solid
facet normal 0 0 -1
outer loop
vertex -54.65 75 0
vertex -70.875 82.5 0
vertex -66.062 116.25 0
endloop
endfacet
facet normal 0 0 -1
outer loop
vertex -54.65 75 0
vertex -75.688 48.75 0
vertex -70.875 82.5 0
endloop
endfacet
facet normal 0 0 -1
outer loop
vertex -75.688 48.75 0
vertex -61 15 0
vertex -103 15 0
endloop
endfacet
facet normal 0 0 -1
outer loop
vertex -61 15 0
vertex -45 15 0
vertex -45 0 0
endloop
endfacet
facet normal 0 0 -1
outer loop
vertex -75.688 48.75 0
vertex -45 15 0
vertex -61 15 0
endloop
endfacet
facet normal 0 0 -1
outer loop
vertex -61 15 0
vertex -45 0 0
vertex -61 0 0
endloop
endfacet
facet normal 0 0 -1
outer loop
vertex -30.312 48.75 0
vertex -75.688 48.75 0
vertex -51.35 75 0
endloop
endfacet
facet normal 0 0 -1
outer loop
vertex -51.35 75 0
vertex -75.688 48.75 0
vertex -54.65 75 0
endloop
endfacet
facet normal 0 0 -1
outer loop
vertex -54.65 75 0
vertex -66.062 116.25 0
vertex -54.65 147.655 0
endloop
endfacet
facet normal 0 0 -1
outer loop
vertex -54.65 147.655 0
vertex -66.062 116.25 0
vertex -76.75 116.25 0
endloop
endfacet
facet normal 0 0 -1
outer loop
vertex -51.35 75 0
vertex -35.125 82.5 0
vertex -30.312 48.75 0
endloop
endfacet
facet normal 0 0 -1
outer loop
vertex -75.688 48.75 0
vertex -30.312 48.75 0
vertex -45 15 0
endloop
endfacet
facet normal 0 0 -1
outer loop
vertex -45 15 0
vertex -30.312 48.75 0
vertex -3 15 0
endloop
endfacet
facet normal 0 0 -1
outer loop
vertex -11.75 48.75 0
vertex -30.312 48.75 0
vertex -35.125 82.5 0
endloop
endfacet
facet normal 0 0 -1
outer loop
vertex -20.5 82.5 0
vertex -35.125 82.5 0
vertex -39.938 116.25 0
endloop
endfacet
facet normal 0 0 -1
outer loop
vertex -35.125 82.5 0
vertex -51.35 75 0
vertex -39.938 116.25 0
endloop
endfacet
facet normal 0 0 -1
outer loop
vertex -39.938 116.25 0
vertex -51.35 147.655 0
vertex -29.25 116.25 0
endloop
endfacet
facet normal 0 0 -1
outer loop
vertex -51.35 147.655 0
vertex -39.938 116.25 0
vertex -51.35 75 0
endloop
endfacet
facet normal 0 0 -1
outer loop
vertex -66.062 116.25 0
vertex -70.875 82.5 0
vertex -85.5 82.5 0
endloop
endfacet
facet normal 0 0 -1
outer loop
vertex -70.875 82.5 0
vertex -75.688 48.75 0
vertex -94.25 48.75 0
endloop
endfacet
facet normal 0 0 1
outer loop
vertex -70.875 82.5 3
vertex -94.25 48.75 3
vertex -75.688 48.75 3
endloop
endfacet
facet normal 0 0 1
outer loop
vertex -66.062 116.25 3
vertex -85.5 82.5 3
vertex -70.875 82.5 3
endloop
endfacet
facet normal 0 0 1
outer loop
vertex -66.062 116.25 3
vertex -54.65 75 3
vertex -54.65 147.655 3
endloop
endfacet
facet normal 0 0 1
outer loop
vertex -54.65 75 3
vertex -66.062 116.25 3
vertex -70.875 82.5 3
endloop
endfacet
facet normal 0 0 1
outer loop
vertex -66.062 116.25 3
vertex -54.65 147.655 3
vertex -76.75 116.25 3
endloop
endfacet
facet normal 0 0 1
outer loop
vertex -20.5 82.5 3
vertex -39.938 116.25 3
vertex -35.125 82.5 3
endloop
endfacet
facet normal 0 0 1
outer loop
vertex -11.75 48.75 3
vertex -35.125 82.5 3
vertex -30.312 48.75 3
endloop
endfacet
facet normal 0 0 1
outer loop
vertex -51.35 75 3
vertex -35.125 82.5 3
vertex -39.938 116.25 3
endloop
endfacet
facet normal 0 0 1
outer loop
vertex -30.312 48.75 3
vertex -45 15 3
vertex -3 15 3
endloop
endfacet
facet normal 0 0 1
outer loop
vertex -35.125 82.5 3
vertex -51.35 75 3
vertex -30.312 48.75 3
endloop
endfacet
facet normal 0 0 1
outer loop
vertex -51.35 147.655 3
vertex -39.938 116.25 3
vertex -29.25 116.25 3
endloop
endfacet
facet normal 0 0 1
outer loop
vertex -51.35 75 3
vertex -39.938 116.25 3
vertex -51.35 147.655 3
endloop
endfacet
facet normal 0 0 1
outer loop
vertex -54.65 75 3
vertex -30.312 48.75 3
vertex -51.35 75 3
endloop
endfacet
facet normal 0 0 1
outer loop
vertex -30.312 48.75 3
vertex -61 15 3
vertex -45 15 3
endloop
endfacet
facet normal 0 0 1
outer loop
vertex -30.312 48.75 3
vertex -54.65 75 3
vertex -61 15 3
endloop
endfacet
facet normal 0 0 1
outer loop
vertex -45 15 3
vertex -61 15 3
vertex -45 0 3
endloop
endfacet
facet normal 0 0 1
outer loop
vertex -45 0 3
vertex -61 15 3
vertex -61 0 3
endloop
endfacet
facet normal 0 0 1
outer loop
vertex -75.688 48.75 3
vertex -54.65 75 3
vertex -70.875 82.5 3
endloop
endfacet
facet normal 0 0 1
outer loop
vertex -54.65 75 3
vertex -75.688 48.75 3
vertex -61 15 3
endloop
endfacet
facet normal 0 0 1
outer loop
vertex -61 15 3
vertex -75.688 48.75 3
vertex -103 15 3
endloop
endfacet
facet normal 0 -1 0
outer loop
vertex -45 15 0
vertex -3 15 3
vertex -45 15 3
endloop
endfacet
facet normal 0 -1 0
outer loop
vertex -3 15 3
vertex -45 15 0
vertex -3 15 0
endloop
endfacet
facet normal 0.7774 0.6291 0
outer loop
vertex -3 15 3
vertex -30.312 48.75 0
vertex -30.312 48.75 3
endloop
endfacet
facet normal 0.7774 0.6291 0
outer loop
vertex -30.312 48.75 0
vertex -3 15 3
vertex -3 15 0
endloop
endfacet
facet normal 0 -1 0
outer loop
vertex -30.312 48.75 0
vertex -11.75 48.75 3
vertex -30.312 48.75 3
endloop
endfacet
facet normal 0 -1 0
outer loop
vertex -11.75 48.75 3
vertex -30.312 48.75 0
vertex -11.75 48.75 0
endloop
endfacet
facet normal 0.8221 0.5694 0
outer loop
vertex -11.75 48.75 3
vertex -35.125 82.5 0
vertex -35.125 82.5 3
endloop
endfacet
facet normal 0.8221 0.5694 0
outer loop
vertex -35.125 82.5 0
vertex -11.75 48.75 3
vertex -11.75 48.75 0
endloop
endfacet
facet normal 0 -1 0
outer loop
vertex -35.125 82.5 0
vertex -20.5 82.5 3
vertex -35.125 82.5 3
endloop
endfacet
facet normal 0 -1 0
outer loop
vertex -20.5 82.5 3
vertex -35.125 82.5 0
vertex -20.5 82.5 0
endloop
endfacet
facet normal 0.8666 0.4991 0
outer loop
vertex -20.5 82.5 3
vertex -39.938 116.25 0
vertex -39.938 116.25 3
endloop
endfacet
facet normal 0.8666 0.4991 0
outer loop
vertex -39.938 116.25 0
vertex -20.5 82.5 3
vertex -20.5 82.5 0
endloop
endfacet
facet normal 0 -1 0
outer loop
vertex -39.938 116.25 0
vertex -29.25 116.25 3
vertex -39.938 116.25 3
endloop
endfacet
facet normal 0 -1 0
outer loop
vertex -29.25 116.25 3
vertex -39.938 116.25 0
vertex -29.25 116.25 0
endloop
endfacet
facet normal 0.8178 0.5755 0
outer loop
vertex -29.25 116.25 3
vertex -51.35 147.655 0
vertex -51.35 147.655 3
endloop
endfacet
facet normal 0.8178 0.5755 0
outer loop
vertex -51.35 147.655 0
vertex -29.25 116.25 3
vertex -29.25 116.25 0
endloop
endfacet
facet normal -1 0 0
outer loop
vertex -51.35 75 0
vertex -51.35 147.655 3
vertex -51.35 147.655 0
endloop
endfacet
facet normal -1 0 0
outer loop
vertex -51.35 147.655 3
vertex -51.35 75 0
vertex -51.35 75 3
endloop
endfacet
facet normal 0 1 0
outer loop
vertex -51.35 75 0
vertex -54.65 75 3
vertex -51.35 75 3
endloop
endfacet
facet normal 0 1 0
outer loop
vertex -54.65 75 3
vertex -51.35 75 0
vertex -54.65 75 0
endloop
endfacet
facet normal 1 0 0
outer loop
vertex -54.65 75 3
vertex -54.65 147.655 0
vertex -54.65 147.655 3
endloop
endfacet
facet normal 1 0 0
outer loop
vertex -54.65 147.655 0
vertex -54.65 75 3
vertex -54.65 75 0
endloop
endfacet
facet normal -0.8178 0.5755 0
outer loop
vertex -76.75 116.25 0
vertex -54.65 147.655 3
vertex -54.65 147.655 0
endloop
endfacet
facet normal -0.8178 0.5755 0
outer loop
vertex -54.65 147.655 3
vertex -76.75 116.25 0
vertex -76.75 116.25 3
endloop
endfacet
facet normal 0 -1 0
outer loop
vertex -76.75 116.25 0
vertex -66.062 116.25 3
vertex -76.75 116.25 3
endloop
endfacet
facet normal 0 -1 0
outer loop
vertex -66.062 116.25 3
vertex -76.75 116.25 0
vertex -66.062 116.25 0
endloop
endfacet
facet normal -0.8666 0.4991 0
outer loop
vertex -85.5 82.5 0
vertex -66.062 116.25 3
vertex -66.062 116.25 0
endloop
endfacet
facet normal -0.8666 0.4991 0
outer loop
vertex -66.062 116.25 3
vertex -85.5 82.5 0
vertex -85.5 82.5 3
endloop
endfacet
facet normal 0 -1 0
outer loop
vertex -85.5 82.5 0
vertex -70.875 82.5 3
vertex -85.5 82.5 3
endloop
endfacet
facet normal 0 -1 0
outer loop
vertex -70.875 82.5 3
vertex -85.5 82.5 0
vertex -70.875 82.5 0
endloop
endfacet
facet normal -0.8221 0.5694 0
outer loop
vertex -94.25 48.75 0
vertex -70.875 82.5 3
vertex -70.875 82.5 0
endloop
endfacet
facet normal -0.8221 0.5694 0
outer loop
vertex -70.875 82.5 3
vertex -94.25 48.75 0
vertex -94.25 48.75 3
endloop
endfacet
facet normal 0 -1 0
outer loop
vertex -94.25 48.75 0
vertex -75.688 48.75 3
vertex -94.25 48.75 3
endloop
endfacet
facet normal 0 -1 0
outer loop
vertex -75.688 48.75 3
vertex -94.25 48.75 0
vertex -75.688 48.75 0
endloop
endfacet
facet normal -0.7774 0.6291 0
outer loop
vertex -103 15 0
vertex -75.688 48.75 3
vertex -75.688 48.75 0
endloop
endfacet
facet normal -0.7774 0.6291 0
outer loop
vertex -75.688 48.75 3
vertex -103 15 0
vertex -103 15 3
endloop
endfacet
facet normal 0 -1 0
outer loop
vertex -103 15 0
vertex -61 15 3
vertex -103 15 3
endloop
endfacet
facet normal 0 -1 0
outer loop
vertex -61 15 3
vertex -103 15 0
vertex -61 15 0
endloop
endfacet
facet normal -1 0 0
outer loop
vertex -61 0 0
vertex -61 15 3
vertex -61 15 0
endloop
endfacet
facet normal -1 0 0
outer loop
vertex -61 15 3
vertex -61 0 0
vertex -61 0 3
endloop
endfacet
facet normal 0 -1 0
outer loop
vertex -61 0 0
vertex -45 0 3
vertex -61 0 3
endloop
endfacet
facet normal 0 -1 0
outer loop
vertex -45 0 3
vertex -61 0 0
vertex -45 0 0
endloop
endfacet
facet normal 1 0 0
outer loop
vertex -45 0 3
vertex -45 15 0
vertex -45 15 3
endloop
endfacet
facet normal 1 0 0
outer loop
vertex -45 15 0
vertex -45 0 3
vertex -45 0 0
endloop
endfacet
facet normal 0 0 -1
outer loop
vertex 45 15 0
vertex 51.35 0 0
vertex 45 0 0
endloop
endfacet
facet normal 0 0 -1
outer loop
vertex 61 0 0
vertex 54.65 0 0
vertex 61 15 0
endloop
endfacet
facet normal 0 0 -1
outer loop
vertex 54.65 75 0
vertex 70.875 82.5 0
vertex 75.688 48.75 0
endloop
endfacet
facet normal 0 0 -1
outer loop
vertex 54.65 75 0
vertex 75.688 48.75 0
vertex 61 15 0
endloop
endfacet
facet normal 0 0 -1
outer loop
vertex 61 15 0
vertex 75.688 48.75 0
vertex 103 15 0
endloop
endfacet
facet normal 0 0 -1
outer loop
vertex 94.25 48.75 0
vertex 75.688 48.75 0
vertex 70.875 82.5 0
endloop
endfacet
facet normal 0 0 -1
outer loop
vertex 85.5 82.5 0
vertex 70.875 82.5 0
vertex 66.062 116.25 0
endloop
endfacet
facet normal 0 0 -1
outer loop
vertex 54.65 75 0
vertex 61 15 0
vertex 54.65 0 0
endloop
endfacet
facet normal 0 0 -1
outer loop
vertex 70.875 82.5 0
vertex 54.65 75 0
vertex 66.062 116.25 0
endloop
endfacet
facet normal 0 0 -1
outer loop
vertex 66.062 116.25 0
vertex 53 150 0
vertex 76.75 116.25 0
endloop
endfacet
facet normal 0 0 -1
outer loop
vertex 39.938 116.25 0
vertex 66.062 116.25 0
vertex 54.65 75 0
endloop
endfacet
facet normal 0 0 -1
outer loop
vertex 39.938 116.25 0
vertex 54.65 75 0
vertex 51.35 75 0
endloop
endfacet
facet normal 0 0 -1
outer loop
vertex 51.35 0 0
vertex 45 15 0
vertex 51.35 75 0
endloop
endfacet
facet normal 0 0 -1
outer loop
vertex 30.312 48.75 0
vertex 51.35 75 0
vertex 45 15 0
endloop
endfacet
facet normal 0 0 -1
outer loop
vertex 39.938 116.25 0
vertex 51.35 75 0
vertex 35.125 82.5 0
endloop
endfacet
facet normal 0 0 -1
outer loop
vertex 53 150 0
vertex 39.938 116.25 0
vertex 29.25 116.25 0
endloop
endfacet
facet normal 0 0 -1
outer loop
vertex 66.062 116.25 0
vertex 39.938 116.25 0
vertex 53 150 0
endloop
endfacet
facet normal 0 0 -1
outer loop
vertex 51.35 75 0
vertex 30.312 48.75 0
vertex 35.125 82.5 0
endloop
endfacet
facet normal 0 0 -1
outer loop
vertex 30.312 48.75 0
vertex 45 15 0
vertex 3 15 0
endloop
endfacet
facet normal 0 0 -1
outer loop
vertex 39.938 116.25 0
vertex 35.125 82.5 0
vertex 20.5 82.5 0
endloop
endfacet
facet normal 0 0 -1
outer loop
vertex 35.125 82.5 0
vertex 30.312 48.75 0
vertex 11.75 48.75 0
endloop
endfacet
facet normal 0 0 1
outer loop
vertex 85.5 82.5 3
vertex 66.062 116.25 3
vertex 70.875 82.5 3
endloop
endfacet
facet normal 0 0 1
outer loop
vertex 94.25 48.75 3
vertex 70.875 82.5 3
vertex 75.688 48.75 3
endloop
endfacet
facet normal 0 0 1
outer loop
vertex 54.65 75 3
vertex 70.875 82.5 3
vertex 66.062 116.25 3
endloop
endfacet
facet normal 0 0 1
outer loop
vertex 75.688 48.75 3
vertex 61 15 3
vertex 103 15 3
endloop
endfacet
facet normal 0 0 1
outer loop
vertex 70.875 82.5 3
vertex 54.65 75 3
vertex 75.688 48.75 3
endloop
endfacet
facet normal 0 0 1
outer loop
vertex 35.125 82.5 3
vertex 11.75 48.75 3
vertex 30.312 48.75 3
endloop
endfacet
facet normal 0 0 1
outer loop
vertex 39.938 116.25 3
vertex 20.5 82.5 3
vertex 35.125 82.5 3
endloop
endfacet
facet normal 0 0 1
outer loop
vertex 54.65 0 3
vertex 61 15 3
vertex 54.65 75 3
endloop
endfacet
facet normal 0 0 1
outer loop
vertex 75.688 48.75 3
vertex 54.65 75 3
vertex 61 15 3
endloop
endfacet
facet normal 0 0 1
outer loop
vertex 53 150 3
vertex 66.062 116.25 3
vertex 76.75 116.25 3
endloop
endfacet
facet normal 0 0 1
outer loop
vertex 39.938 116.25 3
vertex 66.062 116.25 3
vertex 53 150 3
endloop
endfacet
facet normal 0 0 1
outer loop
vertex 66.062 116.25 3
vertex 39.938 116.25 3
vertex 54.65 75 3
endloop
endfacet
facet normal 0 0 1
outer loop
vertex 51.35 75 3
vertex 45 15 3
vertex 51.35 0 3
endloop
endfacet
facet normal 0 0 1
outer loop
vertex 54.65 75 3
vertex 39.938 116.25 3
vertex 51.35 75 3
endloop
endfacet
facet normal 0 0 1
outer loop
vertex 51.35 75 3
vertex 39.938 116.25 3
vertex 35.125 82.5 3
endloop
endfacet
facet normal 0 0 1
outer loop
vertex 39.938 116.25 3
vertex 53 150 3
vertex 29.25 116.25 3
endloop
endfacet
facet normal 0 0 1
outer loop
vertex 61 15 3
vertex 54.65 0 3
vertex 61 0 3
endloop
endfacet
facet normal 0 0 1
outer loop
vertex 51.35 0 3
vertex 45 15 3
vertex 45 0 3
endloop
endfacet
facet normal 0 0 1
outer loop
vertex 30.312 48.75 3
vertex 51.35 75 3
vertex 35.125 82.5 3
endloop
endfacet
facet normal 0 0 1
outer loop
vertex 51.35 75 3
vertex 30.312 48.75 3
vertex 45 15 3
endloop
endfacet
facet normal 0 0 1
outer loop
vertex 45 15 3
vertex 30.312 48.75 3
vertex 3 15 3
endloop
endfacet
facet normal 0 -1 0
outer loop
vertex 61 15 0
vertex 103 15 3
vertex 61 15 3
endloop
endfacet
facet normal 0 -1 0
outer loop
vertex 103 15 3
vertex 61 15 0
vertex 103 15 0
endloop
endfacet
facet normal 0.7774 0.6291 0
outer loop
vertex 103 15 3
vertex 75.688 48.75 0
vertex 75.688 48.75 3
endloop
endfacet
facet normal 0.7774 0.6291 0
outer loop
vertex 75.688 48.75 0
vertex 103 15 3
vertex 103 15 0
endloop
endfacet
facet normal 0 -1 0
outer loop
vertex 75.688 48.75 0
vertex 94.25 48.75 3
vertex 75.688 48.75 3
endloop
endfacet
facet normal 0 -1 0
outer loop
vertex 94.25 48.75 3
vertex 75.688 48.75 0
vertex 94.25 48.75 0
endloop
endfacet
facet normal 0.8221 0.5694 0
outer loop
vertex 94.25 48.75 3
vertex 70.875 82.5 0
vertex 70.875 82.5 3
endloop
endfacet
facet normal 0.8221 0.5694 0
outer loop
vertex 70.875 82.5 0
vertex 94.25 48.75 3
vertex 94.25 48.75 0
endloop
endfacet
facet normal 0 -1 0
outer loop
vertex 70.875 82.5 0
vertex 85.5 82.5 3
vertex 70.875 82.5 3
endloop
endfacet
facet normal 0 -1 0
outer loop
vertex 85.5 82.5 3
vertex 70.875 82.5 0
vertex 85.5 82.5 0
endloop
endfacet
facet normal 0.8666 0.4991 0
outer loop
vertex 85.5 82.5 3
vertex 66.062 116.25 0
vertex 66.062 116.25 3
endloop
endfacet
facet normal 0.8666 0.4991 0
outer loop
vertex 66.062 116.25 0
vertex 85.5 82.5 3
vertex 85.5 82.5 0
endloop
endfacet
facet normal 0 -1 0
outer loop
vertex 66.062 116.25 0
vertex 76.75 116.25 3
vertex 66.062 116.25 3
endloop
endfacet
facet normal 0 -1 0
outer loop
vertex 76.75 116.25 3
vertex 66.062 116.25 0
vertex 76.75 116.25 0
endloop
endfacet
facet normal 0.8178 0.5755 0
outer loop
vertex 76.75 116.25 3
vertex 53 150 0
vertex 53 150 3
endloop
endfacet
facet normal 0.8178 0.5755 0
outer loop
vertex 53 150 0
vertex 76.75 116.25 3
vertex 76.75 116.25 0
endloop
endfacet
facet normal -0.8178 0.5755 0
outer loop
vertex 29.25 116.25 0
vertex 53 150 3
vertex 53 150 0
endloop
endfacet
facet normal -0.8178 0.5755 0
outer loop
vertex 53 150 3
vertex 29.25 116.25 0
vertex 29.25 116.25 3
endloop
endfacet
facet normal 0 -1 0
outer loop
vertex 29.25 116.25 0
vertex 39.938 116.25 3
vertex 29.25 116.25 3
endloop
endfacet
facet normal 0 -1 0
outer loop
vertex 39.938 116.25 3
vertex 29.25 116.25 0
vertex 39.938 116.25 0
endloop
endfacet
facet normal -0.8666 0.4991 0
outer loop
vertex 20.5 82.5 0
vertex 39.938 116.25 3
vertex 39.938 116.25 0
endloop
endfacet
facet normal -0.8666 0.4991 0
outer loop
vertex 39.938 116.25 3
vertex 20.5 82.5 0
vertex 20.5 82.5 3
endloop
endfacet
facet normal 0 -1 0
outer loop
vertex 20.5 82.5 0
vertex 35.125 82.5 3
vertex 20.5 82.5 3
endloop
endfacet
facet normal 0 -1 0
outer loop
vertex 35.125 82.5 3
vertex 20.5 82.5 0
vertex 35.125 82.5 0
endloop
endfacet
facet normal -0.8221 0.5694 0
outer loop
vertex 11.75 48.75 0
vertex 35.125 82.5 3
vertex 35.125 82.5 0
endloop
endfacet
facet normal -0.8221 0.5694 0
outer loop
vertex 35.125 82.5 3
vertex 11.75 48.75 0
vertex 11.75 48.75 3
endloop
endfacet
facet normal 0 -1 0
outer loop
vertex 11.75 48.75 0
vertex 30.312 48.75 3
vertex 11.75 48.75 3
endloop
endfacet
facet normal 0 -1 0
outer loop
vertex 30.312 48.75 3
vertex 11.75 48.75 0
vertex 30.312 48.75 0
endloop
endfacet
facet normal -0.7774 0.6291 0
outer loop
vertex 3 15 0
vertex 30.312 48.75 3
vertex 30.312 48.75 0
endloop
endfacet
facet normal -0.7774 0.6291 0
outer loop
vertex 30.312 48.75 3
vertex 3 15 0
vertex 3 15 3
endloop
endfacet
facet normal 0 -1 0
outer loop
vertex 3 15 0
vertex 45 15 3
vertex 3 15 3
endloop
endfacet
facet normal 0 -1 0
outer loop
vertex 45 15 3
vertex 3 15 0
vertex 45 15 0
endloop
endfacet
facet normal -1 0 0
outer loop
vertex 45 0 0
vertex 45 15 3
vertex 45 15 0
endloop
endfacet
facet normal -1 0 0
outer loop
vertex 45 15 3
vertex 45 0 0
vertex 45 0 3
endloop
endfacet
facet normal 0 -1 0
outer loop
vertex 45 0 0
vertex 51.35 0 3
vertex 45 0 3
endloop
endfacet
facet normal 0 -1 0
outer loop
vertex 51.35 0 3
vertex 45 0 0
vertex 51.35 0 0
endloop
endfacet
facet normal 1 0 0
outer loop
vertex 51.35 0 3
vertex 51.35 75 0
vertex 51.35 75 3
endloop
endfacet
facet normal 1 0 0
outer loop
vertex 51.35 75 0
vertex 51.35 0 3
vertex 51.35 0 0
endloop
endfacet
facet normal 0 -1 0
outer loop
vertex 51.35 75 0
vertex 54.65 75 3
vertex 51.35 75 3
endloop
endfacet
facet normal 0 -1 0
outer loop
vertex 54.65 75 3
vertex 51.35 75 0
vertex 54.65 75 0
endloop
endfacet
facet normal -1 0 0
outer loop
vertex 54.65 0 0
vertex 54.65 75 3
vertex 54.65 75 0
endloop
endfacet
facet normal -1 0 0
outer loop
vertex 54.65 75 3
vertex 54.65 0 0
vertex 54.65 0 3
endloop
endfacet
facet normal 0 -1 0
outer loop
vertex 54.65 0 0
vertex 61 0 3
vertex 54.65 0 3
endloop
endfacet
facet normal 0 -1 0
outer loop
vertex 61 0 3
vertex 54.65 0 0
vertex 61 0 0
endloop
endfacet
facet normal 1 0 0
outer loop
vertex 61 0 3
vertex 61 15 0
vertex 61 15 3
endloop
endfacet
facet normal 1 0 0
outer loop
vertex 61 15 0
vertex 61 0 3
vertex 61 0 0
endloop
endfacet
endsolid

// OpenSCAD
// ── ÁRVORE DE ENCAIXE (duas placas) ──
// Duas silhuetas planas de árvore em camadas que encaixam em cruz: uma tem a ranhura de cima
// até meio, a outra de baixo até meio. Imprimem deitadas, lado a lado, sem suportes.
// A mesma conta está em Maker_Pro_Frontend_Prod/lib/arvoresNatal.ts (pré-visualização).
//
// Parâmetros: niveis, largura, altura, espessura, folga (da ranhura), largura_tronco
//   (0 = sem tronco), altura_tronco, estreitar (% do pescoço face à camada seguinte)

function _N()  = is_undef(niveis) ? 4 : max(1, round(niveis));
function _W()  = is_undef(largura) ? 100 : largura;
function _H()  = is_undef(altura) ? 150 : altura;
function _esp() = is_undef(espessura) ? 3 : espessura;
function _fol() = is_undef(folga) ? 0.3 : folga;
function _s()  = _esp() + _fol();                                        // largura da ranhura
function _tw() = is_undef(largura_tronco) ? 16 : largura_tronco;
function _ht() = is_undef(altura_tronco) ? 15 : altura_tronco;
function _e()  = (is_undef(estreitar) ? 55 : estreitar) / 100;
function _tronco() = _tw() > 0 && _ht() > 0;
function _tw2() = max(_tw() / 2, _s() / 2 + 2);                         // o tronco tem de ser mais largo que a ranhura
function _zt() = _tronco() ? _ht() : 0;
function _hc() = (_H() - _zt()) / _N();
function _w(i) = _W() / 2 * (1 - 0.7 * i / _N());                         // meia-largura da camada i em baixo
function _neck(i) = max(_s() / 2 + 1.5, _e() * _w(i + 1));
function _y(i) = _zt() + i * _hc();
// lado direito, de baixo para cima (o esquerdo é o espelho)
function _direita() = concat(
    _tronco() ? [[_tw2(), 0], [_tw2(), _zt()]] : [],
    [for (i = [0 : _N() - 1], p = i < _N() - 1 ? [[_w(i), _y(i)], [_neck(i), _y(i + 1)]] : [[_w(i), _y(i)]]) p],
    [[0, _H()]]);
function _contorno() = let(d = _direita()) concat(d, [for (k = [len(d) - 2 : -1 : 0]) [-d[k][0], d[k][1]]]);
function _wm() = max(_W() / 2, _tw2());

module placa(ranhura_em_cima) {
    linear_extrude(height = _esp())
        difference() {
            polygon(_contorno());
            if (ranhura_em_cima) translate([-_s() / 2, _H() / 2]) square([_s(), _H()]);
            else translate([-_s() / 2, -1]) square([_s(), _H() / 2 + 1]);
        }
}
translate([-(_wm() + 3), 0, 0]) placa(true);
translate([_wm() + 3, 0, 0]) placa(false);
